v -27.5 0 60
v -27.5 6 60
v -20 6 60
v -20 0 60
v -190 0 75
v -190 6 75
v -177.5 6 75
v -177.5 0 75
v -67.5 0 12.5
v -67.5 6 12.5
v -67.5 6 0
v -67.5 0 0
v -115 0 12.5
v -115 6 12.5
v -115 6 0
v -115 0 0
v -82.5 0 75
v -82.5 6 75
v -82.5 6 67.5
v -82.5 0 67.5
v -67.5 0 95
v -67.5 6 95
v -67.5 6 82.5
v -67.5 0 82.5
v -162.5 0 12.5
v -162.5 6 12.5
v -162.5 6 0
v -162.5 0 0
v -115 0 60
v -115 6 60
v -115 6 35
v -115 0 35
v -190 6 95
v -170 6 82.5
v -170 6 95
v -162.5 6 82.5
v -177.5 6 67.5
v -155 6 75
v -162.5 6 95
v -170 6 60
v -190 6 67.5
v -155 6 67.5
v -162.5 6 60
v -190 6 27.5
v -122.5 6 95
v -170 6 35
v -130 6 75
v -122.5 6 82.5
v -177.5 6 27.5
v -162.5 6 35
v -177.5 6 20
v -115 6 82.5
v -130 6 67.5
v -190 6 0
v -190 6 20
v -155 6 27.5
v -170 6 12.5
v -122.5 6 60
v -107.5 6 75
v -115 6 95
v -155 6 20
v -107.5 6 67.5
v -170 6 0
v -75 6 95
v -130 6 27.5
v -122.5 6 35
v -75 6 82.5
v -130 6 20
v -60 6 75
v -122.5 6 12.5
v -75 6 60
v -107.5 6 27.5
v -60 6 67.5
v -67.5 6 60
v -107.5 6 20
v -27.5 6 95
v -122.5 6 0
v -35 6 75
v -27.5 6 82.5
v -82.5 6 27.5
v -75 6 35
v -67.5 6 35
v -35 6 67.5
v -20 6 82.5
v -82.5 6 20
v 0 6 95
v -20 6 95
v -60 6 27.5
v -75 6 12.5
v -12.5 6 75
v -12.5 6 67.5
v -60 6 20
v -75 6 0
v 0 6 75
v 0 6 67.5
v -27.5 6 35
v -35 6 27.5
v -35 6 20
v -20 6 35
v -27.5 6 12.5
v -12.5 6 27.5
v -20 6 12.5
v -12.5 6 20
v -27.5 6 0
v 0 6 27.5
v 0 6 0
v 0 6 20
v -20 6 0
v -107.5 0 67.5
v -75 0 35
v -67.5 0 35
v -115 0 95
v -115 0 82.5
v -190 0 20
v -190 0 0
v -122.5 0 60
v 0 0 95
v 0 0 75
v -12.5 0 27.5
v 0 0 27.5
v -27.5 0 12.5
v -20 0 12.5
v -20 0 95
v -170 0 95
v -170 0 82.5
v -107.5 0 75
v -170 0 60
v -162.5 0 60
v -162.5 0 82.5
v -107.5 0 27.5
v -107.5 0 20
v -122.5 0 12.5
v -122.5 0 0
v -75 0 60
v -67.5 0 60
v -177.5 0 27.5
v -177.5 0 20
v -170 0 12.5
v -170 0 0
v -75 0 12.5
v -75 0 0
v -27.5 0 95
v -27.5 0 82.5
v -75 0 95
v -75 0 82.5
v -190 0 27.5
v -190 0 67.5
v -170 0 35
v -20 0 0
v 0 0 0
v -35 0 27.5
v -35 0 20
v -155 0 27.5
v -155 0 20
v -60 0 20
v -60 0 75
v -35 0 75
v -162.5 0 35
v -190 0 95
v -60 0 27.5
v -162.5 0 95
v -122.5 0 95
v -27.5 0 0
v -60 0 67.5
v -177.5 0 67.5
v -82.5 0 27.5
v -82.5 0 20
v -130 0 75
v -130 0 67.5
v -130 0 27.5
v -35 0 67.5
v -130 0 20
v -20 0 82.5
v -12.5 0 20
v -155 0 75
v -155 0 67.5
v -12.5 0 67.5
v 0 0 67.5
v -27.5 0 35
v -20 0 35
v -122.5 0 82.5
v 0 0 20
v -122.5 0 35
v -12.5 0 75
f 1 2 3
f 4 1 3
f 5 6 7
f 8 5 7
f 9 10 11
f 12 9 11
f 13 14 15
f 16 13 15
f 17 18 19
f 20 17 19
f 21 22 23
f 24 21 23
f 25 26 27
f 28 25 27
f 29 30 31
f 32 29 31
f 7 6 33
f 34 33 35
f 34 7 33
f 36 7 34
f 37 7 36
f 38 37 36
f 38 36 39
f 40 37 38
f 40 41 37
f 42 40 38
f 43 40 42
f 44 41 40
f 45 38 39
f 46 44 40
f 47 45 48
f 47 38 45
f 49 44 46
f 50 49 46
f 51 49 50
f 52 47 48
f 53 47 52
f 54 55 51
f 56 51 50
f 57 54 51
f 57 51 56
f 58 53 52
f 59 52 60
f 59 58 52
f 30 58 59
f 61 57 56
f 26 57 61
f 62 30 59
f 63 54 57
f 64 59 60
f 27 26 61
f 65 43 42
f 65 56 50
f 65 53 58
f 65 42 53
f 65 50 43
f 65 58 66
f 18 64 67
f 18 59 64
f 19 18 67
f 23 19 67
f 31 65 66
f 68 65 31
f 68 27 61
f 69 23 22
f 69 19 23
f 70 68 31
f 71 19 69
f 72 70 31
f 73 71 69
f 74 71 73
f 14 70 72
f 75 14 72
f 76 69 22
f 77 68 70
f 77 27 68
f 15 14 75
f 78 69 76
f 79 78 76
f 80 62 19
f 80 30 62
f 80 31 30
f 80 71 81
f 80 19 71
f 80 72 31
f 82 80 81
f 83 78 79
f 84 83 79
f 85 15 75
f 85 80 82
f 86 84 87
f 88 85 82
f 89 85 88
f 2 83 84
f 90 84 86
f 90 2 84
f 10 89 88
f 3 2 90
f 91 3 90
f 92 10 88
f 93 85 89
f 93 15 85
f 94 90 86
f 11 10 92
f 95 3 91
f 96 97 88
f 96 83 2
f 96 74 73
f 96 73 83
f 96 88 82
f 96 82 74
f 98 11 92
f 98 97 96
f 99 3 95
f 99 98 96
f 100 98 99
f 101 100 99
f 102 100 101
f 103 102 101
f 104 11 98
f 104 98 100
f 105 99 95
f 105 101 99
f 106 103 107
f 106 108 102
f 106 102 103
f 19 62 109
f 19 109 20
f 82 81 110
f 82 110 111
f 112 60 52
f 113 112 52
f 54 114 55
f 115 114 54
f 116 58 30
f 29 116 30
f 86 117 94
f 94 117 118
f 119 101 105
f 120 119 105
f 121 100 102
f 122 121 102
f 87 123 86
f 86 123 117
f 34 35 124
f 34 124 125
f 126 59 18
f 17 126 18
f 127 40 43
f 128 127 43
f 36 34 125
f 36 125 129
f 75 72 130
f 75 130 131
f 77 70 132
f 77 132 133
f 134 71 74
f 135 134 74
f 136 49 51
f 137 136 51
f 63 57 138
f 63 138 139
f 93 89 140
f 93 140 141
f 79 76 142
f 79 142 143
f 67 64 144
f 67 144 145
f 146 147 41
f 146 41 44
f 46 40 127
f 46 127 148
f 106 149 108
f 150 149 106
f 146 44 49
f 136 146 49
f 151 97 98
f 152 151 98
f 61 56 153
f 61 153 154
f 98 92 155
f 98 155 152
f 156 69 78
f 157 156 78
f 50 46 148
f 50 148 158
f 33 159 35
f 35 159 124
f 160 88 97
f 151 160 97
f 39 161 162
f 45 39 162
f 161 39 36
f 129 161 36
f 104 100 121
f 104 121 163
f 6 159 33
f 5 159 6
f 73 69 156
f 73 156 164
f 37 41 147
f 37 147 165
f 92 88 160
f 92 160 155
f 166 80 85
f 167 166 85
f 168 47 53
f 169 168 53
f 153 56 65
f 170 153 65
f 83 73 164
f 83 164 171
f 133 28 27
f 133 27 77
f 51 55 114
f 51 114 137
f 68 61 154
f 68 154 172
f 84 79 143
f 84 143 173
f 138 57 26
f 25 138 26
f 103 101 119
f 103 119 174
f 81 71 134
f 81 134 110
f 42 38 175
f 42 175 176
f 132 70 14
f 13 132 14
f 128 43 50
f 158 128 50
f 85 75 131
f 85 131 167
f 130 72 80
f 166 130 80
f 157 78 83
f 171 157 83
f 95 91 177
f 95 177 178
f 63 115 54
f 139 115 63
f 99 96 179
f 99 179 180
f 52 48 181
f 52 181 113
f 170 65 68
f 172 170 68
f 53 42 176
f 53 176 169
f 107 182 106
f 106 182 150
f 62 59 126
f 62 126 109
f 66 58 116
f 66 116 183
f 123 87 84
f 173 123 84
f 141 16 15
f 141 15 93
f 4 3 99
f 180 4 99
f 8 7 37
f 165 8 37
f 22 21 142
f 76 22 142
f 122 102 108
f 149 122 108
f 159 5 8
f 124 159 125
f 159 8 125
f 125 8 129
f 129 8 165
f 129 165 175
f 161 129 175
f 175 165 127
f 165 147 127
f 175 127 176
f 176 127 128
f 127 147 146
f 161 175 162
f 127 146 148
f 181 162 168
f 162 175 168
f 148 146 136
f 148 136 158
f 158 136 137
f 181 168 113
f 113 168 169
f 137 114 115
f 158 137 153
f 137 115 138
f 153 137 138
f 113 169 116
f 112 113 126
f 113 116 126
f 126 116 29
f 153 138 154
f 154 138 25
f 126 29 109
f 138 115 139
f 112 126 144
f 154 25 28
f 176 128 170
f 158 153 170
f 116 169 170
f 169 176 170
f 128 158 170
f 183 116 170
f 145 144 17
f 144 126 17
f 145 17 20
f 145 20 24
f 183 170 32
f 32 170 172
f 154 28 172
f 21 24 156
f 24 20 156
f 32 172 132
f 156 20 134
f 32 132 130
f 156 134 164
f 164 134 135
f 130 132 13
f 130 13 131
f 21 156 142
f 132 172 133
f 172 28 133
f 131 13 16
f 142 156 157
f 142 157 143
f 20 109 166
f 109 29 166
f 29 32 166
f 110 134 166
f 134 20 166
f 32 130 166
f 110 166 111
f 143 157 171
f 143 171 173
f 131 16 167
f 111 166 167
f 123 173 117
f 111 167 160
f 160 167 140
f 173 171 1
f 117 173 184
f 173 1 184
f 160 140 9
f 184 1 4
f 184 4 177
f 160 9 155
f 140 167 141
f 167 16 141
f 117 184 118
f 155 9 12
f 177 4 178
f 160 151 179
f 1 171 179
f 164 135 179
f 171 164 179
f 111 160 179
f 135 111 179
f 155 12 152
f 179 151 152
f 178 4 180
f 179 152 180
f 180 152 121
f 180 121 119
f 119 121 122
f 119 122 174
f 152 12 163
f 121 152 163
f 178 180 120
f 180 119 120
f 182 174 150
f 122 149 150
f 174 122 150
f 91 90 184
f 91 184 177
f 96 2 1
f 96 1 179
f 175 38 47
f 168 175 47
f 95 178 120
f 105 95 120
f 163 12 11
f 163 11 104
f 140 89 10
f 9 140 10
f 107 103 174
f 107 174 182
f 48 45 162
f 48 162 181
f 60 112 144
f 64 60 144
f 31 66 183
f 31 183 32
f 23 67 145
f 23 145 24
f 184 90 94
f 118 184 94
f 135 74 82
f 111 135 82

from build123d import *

# Parameters (mm, degrees)
ESQUISSE1_W             = 190
ESQUISSE1_H             = 95
BOSS_EXTRU_1_DEPTH      = 6
ESQUISSE9_W             = 12.5
ESQUISSE9_H             = 7.5
ESQUISSE9_W_2           = 25
ESQUISSE9_W_3           = 7.5
ESQUISSE9_H_2           = 12.5
ESQUISSE9_H_3           = 25
ENL_V_MAT_EXTRU_1_DEPTH = 6


with BuildPart() as part:
    # Esquisse1 → Boss.-Extru.1 (new body)
    with BuildSketch(Plane(origin=(0, 0, 0), x_dir=(1, 0, 0), z_dir=(0, 1, 0))):
        with Locations((-95, -47.5)):
            Rectangle(ESQUISSE1_W, ESQUISSE1_H)
    extrude(amount=BOSS_EXTRU_1_DEPTH)

    # Esquisse9 → Enlèv. mat.-Extru.1 (cut)
    with BuildSketch(Plane(origin=(0, 6, 0), x_dir=(1, 0, 0), z_dir=(0, 1, 0))):
        with Locations((-183.75, -23.75)):
            Rectangle(ESQUISSE9_W, ESQUISSE9_H)
        with Locations((-142.5, -23.75)):
            Rectangle(ESQUISSE9_W_2, ESQUISSE9_H)
        with Locations((-183.75, -71.25)):
            Rectangle(ESQUISSE9_W, ESQUISSE9_H)
        with Locations((-142.5, -71.25)):
            Rectangle(ESQUISSE9_W_2, ESQUISSE9_H)
        with Locations((-95, -71.25)):
            Rectangle(ESQUISSE9_W_2, ESQUISSE9_H)
        with Locations((-95, -23.75)):
            Rectangle(ESQUISSE9_W_2, ESQUISSE9_H)
        with Locations((-47.5, -23.75)):
            Rectangle(ESQUISSE9_W_2, ESQUISSE9_H)
        with Locations((-6.25, -23.75)):
            Rectangle(ESQUISSE9_W, ESQUISSE9_H)
        with Locations((-47.5, -71.25)):
            Rectangle(ESQUISSE9_W_2, ESQUISSE9_H)
        with Locations((-6.25, -71.25)):
            Rectangle(ESQUISSE9_W, ESQUISSE9_H)
        with Locations((-166.25, -88.75)):
            Rectangle(ESQUISSE9_W_3, ESQUISSE9_H_2)
        with Locations((-166.25, -47.5)):
            Rectangle(ESQUISSE9_W_3, ESQUISSE9_H_3)
        with Locations((-166.25, -6.25)):
            Rectangle(ESQUISSE9_W_3, ESQUISSE9_H_2)
        with Locations((-118.75, -88.75)):
            Rectangle(ESQUISSE9_W_3, ESQUISSE9_H_2)
        with Locations((-71.25, -88.75)):
            Rectangle(ESQUISSE9_W_3, ESQUISSE9_H_2)
        with Locations((-23.75, -88.75)):
            Rectangle(ESQUISSE9_W_3, ESQUISSE9_H_2)
        with Locations((-118.75, -47.5)):
            Rectangle(ESQUISSE9_W_3, ESQUISSE9_H_3)
        with Locations((-71.25, -47.5)):
            Rectangle(ESQUISSE9_W_3, ESQUISSE9_H_3)
        with Locations((-23.75, -47.5)):
            Rectangle(ESQUISSE9_W_3, ESQUISSE9_H_3)
        with Locations((-118.75, -6.25)):
            Rectangle(ESQUISSE9_W_3, ESQUISSE9_H_2)
        with Locations((-71.25, -6.25)):
            Rectangle(ESQUISSE9_W_3, ESQUISSE9_H_2)
        with Locations((-23.75, -6.25)):
            Rectangle(ESQUISSE9_W_3, ESQUISSE9_H_2)
    extrude(amount=-ENL_V_MAT_EXTRU_1_DEPTH, mode=Mode.SUBTRACT)


solid = part.part
